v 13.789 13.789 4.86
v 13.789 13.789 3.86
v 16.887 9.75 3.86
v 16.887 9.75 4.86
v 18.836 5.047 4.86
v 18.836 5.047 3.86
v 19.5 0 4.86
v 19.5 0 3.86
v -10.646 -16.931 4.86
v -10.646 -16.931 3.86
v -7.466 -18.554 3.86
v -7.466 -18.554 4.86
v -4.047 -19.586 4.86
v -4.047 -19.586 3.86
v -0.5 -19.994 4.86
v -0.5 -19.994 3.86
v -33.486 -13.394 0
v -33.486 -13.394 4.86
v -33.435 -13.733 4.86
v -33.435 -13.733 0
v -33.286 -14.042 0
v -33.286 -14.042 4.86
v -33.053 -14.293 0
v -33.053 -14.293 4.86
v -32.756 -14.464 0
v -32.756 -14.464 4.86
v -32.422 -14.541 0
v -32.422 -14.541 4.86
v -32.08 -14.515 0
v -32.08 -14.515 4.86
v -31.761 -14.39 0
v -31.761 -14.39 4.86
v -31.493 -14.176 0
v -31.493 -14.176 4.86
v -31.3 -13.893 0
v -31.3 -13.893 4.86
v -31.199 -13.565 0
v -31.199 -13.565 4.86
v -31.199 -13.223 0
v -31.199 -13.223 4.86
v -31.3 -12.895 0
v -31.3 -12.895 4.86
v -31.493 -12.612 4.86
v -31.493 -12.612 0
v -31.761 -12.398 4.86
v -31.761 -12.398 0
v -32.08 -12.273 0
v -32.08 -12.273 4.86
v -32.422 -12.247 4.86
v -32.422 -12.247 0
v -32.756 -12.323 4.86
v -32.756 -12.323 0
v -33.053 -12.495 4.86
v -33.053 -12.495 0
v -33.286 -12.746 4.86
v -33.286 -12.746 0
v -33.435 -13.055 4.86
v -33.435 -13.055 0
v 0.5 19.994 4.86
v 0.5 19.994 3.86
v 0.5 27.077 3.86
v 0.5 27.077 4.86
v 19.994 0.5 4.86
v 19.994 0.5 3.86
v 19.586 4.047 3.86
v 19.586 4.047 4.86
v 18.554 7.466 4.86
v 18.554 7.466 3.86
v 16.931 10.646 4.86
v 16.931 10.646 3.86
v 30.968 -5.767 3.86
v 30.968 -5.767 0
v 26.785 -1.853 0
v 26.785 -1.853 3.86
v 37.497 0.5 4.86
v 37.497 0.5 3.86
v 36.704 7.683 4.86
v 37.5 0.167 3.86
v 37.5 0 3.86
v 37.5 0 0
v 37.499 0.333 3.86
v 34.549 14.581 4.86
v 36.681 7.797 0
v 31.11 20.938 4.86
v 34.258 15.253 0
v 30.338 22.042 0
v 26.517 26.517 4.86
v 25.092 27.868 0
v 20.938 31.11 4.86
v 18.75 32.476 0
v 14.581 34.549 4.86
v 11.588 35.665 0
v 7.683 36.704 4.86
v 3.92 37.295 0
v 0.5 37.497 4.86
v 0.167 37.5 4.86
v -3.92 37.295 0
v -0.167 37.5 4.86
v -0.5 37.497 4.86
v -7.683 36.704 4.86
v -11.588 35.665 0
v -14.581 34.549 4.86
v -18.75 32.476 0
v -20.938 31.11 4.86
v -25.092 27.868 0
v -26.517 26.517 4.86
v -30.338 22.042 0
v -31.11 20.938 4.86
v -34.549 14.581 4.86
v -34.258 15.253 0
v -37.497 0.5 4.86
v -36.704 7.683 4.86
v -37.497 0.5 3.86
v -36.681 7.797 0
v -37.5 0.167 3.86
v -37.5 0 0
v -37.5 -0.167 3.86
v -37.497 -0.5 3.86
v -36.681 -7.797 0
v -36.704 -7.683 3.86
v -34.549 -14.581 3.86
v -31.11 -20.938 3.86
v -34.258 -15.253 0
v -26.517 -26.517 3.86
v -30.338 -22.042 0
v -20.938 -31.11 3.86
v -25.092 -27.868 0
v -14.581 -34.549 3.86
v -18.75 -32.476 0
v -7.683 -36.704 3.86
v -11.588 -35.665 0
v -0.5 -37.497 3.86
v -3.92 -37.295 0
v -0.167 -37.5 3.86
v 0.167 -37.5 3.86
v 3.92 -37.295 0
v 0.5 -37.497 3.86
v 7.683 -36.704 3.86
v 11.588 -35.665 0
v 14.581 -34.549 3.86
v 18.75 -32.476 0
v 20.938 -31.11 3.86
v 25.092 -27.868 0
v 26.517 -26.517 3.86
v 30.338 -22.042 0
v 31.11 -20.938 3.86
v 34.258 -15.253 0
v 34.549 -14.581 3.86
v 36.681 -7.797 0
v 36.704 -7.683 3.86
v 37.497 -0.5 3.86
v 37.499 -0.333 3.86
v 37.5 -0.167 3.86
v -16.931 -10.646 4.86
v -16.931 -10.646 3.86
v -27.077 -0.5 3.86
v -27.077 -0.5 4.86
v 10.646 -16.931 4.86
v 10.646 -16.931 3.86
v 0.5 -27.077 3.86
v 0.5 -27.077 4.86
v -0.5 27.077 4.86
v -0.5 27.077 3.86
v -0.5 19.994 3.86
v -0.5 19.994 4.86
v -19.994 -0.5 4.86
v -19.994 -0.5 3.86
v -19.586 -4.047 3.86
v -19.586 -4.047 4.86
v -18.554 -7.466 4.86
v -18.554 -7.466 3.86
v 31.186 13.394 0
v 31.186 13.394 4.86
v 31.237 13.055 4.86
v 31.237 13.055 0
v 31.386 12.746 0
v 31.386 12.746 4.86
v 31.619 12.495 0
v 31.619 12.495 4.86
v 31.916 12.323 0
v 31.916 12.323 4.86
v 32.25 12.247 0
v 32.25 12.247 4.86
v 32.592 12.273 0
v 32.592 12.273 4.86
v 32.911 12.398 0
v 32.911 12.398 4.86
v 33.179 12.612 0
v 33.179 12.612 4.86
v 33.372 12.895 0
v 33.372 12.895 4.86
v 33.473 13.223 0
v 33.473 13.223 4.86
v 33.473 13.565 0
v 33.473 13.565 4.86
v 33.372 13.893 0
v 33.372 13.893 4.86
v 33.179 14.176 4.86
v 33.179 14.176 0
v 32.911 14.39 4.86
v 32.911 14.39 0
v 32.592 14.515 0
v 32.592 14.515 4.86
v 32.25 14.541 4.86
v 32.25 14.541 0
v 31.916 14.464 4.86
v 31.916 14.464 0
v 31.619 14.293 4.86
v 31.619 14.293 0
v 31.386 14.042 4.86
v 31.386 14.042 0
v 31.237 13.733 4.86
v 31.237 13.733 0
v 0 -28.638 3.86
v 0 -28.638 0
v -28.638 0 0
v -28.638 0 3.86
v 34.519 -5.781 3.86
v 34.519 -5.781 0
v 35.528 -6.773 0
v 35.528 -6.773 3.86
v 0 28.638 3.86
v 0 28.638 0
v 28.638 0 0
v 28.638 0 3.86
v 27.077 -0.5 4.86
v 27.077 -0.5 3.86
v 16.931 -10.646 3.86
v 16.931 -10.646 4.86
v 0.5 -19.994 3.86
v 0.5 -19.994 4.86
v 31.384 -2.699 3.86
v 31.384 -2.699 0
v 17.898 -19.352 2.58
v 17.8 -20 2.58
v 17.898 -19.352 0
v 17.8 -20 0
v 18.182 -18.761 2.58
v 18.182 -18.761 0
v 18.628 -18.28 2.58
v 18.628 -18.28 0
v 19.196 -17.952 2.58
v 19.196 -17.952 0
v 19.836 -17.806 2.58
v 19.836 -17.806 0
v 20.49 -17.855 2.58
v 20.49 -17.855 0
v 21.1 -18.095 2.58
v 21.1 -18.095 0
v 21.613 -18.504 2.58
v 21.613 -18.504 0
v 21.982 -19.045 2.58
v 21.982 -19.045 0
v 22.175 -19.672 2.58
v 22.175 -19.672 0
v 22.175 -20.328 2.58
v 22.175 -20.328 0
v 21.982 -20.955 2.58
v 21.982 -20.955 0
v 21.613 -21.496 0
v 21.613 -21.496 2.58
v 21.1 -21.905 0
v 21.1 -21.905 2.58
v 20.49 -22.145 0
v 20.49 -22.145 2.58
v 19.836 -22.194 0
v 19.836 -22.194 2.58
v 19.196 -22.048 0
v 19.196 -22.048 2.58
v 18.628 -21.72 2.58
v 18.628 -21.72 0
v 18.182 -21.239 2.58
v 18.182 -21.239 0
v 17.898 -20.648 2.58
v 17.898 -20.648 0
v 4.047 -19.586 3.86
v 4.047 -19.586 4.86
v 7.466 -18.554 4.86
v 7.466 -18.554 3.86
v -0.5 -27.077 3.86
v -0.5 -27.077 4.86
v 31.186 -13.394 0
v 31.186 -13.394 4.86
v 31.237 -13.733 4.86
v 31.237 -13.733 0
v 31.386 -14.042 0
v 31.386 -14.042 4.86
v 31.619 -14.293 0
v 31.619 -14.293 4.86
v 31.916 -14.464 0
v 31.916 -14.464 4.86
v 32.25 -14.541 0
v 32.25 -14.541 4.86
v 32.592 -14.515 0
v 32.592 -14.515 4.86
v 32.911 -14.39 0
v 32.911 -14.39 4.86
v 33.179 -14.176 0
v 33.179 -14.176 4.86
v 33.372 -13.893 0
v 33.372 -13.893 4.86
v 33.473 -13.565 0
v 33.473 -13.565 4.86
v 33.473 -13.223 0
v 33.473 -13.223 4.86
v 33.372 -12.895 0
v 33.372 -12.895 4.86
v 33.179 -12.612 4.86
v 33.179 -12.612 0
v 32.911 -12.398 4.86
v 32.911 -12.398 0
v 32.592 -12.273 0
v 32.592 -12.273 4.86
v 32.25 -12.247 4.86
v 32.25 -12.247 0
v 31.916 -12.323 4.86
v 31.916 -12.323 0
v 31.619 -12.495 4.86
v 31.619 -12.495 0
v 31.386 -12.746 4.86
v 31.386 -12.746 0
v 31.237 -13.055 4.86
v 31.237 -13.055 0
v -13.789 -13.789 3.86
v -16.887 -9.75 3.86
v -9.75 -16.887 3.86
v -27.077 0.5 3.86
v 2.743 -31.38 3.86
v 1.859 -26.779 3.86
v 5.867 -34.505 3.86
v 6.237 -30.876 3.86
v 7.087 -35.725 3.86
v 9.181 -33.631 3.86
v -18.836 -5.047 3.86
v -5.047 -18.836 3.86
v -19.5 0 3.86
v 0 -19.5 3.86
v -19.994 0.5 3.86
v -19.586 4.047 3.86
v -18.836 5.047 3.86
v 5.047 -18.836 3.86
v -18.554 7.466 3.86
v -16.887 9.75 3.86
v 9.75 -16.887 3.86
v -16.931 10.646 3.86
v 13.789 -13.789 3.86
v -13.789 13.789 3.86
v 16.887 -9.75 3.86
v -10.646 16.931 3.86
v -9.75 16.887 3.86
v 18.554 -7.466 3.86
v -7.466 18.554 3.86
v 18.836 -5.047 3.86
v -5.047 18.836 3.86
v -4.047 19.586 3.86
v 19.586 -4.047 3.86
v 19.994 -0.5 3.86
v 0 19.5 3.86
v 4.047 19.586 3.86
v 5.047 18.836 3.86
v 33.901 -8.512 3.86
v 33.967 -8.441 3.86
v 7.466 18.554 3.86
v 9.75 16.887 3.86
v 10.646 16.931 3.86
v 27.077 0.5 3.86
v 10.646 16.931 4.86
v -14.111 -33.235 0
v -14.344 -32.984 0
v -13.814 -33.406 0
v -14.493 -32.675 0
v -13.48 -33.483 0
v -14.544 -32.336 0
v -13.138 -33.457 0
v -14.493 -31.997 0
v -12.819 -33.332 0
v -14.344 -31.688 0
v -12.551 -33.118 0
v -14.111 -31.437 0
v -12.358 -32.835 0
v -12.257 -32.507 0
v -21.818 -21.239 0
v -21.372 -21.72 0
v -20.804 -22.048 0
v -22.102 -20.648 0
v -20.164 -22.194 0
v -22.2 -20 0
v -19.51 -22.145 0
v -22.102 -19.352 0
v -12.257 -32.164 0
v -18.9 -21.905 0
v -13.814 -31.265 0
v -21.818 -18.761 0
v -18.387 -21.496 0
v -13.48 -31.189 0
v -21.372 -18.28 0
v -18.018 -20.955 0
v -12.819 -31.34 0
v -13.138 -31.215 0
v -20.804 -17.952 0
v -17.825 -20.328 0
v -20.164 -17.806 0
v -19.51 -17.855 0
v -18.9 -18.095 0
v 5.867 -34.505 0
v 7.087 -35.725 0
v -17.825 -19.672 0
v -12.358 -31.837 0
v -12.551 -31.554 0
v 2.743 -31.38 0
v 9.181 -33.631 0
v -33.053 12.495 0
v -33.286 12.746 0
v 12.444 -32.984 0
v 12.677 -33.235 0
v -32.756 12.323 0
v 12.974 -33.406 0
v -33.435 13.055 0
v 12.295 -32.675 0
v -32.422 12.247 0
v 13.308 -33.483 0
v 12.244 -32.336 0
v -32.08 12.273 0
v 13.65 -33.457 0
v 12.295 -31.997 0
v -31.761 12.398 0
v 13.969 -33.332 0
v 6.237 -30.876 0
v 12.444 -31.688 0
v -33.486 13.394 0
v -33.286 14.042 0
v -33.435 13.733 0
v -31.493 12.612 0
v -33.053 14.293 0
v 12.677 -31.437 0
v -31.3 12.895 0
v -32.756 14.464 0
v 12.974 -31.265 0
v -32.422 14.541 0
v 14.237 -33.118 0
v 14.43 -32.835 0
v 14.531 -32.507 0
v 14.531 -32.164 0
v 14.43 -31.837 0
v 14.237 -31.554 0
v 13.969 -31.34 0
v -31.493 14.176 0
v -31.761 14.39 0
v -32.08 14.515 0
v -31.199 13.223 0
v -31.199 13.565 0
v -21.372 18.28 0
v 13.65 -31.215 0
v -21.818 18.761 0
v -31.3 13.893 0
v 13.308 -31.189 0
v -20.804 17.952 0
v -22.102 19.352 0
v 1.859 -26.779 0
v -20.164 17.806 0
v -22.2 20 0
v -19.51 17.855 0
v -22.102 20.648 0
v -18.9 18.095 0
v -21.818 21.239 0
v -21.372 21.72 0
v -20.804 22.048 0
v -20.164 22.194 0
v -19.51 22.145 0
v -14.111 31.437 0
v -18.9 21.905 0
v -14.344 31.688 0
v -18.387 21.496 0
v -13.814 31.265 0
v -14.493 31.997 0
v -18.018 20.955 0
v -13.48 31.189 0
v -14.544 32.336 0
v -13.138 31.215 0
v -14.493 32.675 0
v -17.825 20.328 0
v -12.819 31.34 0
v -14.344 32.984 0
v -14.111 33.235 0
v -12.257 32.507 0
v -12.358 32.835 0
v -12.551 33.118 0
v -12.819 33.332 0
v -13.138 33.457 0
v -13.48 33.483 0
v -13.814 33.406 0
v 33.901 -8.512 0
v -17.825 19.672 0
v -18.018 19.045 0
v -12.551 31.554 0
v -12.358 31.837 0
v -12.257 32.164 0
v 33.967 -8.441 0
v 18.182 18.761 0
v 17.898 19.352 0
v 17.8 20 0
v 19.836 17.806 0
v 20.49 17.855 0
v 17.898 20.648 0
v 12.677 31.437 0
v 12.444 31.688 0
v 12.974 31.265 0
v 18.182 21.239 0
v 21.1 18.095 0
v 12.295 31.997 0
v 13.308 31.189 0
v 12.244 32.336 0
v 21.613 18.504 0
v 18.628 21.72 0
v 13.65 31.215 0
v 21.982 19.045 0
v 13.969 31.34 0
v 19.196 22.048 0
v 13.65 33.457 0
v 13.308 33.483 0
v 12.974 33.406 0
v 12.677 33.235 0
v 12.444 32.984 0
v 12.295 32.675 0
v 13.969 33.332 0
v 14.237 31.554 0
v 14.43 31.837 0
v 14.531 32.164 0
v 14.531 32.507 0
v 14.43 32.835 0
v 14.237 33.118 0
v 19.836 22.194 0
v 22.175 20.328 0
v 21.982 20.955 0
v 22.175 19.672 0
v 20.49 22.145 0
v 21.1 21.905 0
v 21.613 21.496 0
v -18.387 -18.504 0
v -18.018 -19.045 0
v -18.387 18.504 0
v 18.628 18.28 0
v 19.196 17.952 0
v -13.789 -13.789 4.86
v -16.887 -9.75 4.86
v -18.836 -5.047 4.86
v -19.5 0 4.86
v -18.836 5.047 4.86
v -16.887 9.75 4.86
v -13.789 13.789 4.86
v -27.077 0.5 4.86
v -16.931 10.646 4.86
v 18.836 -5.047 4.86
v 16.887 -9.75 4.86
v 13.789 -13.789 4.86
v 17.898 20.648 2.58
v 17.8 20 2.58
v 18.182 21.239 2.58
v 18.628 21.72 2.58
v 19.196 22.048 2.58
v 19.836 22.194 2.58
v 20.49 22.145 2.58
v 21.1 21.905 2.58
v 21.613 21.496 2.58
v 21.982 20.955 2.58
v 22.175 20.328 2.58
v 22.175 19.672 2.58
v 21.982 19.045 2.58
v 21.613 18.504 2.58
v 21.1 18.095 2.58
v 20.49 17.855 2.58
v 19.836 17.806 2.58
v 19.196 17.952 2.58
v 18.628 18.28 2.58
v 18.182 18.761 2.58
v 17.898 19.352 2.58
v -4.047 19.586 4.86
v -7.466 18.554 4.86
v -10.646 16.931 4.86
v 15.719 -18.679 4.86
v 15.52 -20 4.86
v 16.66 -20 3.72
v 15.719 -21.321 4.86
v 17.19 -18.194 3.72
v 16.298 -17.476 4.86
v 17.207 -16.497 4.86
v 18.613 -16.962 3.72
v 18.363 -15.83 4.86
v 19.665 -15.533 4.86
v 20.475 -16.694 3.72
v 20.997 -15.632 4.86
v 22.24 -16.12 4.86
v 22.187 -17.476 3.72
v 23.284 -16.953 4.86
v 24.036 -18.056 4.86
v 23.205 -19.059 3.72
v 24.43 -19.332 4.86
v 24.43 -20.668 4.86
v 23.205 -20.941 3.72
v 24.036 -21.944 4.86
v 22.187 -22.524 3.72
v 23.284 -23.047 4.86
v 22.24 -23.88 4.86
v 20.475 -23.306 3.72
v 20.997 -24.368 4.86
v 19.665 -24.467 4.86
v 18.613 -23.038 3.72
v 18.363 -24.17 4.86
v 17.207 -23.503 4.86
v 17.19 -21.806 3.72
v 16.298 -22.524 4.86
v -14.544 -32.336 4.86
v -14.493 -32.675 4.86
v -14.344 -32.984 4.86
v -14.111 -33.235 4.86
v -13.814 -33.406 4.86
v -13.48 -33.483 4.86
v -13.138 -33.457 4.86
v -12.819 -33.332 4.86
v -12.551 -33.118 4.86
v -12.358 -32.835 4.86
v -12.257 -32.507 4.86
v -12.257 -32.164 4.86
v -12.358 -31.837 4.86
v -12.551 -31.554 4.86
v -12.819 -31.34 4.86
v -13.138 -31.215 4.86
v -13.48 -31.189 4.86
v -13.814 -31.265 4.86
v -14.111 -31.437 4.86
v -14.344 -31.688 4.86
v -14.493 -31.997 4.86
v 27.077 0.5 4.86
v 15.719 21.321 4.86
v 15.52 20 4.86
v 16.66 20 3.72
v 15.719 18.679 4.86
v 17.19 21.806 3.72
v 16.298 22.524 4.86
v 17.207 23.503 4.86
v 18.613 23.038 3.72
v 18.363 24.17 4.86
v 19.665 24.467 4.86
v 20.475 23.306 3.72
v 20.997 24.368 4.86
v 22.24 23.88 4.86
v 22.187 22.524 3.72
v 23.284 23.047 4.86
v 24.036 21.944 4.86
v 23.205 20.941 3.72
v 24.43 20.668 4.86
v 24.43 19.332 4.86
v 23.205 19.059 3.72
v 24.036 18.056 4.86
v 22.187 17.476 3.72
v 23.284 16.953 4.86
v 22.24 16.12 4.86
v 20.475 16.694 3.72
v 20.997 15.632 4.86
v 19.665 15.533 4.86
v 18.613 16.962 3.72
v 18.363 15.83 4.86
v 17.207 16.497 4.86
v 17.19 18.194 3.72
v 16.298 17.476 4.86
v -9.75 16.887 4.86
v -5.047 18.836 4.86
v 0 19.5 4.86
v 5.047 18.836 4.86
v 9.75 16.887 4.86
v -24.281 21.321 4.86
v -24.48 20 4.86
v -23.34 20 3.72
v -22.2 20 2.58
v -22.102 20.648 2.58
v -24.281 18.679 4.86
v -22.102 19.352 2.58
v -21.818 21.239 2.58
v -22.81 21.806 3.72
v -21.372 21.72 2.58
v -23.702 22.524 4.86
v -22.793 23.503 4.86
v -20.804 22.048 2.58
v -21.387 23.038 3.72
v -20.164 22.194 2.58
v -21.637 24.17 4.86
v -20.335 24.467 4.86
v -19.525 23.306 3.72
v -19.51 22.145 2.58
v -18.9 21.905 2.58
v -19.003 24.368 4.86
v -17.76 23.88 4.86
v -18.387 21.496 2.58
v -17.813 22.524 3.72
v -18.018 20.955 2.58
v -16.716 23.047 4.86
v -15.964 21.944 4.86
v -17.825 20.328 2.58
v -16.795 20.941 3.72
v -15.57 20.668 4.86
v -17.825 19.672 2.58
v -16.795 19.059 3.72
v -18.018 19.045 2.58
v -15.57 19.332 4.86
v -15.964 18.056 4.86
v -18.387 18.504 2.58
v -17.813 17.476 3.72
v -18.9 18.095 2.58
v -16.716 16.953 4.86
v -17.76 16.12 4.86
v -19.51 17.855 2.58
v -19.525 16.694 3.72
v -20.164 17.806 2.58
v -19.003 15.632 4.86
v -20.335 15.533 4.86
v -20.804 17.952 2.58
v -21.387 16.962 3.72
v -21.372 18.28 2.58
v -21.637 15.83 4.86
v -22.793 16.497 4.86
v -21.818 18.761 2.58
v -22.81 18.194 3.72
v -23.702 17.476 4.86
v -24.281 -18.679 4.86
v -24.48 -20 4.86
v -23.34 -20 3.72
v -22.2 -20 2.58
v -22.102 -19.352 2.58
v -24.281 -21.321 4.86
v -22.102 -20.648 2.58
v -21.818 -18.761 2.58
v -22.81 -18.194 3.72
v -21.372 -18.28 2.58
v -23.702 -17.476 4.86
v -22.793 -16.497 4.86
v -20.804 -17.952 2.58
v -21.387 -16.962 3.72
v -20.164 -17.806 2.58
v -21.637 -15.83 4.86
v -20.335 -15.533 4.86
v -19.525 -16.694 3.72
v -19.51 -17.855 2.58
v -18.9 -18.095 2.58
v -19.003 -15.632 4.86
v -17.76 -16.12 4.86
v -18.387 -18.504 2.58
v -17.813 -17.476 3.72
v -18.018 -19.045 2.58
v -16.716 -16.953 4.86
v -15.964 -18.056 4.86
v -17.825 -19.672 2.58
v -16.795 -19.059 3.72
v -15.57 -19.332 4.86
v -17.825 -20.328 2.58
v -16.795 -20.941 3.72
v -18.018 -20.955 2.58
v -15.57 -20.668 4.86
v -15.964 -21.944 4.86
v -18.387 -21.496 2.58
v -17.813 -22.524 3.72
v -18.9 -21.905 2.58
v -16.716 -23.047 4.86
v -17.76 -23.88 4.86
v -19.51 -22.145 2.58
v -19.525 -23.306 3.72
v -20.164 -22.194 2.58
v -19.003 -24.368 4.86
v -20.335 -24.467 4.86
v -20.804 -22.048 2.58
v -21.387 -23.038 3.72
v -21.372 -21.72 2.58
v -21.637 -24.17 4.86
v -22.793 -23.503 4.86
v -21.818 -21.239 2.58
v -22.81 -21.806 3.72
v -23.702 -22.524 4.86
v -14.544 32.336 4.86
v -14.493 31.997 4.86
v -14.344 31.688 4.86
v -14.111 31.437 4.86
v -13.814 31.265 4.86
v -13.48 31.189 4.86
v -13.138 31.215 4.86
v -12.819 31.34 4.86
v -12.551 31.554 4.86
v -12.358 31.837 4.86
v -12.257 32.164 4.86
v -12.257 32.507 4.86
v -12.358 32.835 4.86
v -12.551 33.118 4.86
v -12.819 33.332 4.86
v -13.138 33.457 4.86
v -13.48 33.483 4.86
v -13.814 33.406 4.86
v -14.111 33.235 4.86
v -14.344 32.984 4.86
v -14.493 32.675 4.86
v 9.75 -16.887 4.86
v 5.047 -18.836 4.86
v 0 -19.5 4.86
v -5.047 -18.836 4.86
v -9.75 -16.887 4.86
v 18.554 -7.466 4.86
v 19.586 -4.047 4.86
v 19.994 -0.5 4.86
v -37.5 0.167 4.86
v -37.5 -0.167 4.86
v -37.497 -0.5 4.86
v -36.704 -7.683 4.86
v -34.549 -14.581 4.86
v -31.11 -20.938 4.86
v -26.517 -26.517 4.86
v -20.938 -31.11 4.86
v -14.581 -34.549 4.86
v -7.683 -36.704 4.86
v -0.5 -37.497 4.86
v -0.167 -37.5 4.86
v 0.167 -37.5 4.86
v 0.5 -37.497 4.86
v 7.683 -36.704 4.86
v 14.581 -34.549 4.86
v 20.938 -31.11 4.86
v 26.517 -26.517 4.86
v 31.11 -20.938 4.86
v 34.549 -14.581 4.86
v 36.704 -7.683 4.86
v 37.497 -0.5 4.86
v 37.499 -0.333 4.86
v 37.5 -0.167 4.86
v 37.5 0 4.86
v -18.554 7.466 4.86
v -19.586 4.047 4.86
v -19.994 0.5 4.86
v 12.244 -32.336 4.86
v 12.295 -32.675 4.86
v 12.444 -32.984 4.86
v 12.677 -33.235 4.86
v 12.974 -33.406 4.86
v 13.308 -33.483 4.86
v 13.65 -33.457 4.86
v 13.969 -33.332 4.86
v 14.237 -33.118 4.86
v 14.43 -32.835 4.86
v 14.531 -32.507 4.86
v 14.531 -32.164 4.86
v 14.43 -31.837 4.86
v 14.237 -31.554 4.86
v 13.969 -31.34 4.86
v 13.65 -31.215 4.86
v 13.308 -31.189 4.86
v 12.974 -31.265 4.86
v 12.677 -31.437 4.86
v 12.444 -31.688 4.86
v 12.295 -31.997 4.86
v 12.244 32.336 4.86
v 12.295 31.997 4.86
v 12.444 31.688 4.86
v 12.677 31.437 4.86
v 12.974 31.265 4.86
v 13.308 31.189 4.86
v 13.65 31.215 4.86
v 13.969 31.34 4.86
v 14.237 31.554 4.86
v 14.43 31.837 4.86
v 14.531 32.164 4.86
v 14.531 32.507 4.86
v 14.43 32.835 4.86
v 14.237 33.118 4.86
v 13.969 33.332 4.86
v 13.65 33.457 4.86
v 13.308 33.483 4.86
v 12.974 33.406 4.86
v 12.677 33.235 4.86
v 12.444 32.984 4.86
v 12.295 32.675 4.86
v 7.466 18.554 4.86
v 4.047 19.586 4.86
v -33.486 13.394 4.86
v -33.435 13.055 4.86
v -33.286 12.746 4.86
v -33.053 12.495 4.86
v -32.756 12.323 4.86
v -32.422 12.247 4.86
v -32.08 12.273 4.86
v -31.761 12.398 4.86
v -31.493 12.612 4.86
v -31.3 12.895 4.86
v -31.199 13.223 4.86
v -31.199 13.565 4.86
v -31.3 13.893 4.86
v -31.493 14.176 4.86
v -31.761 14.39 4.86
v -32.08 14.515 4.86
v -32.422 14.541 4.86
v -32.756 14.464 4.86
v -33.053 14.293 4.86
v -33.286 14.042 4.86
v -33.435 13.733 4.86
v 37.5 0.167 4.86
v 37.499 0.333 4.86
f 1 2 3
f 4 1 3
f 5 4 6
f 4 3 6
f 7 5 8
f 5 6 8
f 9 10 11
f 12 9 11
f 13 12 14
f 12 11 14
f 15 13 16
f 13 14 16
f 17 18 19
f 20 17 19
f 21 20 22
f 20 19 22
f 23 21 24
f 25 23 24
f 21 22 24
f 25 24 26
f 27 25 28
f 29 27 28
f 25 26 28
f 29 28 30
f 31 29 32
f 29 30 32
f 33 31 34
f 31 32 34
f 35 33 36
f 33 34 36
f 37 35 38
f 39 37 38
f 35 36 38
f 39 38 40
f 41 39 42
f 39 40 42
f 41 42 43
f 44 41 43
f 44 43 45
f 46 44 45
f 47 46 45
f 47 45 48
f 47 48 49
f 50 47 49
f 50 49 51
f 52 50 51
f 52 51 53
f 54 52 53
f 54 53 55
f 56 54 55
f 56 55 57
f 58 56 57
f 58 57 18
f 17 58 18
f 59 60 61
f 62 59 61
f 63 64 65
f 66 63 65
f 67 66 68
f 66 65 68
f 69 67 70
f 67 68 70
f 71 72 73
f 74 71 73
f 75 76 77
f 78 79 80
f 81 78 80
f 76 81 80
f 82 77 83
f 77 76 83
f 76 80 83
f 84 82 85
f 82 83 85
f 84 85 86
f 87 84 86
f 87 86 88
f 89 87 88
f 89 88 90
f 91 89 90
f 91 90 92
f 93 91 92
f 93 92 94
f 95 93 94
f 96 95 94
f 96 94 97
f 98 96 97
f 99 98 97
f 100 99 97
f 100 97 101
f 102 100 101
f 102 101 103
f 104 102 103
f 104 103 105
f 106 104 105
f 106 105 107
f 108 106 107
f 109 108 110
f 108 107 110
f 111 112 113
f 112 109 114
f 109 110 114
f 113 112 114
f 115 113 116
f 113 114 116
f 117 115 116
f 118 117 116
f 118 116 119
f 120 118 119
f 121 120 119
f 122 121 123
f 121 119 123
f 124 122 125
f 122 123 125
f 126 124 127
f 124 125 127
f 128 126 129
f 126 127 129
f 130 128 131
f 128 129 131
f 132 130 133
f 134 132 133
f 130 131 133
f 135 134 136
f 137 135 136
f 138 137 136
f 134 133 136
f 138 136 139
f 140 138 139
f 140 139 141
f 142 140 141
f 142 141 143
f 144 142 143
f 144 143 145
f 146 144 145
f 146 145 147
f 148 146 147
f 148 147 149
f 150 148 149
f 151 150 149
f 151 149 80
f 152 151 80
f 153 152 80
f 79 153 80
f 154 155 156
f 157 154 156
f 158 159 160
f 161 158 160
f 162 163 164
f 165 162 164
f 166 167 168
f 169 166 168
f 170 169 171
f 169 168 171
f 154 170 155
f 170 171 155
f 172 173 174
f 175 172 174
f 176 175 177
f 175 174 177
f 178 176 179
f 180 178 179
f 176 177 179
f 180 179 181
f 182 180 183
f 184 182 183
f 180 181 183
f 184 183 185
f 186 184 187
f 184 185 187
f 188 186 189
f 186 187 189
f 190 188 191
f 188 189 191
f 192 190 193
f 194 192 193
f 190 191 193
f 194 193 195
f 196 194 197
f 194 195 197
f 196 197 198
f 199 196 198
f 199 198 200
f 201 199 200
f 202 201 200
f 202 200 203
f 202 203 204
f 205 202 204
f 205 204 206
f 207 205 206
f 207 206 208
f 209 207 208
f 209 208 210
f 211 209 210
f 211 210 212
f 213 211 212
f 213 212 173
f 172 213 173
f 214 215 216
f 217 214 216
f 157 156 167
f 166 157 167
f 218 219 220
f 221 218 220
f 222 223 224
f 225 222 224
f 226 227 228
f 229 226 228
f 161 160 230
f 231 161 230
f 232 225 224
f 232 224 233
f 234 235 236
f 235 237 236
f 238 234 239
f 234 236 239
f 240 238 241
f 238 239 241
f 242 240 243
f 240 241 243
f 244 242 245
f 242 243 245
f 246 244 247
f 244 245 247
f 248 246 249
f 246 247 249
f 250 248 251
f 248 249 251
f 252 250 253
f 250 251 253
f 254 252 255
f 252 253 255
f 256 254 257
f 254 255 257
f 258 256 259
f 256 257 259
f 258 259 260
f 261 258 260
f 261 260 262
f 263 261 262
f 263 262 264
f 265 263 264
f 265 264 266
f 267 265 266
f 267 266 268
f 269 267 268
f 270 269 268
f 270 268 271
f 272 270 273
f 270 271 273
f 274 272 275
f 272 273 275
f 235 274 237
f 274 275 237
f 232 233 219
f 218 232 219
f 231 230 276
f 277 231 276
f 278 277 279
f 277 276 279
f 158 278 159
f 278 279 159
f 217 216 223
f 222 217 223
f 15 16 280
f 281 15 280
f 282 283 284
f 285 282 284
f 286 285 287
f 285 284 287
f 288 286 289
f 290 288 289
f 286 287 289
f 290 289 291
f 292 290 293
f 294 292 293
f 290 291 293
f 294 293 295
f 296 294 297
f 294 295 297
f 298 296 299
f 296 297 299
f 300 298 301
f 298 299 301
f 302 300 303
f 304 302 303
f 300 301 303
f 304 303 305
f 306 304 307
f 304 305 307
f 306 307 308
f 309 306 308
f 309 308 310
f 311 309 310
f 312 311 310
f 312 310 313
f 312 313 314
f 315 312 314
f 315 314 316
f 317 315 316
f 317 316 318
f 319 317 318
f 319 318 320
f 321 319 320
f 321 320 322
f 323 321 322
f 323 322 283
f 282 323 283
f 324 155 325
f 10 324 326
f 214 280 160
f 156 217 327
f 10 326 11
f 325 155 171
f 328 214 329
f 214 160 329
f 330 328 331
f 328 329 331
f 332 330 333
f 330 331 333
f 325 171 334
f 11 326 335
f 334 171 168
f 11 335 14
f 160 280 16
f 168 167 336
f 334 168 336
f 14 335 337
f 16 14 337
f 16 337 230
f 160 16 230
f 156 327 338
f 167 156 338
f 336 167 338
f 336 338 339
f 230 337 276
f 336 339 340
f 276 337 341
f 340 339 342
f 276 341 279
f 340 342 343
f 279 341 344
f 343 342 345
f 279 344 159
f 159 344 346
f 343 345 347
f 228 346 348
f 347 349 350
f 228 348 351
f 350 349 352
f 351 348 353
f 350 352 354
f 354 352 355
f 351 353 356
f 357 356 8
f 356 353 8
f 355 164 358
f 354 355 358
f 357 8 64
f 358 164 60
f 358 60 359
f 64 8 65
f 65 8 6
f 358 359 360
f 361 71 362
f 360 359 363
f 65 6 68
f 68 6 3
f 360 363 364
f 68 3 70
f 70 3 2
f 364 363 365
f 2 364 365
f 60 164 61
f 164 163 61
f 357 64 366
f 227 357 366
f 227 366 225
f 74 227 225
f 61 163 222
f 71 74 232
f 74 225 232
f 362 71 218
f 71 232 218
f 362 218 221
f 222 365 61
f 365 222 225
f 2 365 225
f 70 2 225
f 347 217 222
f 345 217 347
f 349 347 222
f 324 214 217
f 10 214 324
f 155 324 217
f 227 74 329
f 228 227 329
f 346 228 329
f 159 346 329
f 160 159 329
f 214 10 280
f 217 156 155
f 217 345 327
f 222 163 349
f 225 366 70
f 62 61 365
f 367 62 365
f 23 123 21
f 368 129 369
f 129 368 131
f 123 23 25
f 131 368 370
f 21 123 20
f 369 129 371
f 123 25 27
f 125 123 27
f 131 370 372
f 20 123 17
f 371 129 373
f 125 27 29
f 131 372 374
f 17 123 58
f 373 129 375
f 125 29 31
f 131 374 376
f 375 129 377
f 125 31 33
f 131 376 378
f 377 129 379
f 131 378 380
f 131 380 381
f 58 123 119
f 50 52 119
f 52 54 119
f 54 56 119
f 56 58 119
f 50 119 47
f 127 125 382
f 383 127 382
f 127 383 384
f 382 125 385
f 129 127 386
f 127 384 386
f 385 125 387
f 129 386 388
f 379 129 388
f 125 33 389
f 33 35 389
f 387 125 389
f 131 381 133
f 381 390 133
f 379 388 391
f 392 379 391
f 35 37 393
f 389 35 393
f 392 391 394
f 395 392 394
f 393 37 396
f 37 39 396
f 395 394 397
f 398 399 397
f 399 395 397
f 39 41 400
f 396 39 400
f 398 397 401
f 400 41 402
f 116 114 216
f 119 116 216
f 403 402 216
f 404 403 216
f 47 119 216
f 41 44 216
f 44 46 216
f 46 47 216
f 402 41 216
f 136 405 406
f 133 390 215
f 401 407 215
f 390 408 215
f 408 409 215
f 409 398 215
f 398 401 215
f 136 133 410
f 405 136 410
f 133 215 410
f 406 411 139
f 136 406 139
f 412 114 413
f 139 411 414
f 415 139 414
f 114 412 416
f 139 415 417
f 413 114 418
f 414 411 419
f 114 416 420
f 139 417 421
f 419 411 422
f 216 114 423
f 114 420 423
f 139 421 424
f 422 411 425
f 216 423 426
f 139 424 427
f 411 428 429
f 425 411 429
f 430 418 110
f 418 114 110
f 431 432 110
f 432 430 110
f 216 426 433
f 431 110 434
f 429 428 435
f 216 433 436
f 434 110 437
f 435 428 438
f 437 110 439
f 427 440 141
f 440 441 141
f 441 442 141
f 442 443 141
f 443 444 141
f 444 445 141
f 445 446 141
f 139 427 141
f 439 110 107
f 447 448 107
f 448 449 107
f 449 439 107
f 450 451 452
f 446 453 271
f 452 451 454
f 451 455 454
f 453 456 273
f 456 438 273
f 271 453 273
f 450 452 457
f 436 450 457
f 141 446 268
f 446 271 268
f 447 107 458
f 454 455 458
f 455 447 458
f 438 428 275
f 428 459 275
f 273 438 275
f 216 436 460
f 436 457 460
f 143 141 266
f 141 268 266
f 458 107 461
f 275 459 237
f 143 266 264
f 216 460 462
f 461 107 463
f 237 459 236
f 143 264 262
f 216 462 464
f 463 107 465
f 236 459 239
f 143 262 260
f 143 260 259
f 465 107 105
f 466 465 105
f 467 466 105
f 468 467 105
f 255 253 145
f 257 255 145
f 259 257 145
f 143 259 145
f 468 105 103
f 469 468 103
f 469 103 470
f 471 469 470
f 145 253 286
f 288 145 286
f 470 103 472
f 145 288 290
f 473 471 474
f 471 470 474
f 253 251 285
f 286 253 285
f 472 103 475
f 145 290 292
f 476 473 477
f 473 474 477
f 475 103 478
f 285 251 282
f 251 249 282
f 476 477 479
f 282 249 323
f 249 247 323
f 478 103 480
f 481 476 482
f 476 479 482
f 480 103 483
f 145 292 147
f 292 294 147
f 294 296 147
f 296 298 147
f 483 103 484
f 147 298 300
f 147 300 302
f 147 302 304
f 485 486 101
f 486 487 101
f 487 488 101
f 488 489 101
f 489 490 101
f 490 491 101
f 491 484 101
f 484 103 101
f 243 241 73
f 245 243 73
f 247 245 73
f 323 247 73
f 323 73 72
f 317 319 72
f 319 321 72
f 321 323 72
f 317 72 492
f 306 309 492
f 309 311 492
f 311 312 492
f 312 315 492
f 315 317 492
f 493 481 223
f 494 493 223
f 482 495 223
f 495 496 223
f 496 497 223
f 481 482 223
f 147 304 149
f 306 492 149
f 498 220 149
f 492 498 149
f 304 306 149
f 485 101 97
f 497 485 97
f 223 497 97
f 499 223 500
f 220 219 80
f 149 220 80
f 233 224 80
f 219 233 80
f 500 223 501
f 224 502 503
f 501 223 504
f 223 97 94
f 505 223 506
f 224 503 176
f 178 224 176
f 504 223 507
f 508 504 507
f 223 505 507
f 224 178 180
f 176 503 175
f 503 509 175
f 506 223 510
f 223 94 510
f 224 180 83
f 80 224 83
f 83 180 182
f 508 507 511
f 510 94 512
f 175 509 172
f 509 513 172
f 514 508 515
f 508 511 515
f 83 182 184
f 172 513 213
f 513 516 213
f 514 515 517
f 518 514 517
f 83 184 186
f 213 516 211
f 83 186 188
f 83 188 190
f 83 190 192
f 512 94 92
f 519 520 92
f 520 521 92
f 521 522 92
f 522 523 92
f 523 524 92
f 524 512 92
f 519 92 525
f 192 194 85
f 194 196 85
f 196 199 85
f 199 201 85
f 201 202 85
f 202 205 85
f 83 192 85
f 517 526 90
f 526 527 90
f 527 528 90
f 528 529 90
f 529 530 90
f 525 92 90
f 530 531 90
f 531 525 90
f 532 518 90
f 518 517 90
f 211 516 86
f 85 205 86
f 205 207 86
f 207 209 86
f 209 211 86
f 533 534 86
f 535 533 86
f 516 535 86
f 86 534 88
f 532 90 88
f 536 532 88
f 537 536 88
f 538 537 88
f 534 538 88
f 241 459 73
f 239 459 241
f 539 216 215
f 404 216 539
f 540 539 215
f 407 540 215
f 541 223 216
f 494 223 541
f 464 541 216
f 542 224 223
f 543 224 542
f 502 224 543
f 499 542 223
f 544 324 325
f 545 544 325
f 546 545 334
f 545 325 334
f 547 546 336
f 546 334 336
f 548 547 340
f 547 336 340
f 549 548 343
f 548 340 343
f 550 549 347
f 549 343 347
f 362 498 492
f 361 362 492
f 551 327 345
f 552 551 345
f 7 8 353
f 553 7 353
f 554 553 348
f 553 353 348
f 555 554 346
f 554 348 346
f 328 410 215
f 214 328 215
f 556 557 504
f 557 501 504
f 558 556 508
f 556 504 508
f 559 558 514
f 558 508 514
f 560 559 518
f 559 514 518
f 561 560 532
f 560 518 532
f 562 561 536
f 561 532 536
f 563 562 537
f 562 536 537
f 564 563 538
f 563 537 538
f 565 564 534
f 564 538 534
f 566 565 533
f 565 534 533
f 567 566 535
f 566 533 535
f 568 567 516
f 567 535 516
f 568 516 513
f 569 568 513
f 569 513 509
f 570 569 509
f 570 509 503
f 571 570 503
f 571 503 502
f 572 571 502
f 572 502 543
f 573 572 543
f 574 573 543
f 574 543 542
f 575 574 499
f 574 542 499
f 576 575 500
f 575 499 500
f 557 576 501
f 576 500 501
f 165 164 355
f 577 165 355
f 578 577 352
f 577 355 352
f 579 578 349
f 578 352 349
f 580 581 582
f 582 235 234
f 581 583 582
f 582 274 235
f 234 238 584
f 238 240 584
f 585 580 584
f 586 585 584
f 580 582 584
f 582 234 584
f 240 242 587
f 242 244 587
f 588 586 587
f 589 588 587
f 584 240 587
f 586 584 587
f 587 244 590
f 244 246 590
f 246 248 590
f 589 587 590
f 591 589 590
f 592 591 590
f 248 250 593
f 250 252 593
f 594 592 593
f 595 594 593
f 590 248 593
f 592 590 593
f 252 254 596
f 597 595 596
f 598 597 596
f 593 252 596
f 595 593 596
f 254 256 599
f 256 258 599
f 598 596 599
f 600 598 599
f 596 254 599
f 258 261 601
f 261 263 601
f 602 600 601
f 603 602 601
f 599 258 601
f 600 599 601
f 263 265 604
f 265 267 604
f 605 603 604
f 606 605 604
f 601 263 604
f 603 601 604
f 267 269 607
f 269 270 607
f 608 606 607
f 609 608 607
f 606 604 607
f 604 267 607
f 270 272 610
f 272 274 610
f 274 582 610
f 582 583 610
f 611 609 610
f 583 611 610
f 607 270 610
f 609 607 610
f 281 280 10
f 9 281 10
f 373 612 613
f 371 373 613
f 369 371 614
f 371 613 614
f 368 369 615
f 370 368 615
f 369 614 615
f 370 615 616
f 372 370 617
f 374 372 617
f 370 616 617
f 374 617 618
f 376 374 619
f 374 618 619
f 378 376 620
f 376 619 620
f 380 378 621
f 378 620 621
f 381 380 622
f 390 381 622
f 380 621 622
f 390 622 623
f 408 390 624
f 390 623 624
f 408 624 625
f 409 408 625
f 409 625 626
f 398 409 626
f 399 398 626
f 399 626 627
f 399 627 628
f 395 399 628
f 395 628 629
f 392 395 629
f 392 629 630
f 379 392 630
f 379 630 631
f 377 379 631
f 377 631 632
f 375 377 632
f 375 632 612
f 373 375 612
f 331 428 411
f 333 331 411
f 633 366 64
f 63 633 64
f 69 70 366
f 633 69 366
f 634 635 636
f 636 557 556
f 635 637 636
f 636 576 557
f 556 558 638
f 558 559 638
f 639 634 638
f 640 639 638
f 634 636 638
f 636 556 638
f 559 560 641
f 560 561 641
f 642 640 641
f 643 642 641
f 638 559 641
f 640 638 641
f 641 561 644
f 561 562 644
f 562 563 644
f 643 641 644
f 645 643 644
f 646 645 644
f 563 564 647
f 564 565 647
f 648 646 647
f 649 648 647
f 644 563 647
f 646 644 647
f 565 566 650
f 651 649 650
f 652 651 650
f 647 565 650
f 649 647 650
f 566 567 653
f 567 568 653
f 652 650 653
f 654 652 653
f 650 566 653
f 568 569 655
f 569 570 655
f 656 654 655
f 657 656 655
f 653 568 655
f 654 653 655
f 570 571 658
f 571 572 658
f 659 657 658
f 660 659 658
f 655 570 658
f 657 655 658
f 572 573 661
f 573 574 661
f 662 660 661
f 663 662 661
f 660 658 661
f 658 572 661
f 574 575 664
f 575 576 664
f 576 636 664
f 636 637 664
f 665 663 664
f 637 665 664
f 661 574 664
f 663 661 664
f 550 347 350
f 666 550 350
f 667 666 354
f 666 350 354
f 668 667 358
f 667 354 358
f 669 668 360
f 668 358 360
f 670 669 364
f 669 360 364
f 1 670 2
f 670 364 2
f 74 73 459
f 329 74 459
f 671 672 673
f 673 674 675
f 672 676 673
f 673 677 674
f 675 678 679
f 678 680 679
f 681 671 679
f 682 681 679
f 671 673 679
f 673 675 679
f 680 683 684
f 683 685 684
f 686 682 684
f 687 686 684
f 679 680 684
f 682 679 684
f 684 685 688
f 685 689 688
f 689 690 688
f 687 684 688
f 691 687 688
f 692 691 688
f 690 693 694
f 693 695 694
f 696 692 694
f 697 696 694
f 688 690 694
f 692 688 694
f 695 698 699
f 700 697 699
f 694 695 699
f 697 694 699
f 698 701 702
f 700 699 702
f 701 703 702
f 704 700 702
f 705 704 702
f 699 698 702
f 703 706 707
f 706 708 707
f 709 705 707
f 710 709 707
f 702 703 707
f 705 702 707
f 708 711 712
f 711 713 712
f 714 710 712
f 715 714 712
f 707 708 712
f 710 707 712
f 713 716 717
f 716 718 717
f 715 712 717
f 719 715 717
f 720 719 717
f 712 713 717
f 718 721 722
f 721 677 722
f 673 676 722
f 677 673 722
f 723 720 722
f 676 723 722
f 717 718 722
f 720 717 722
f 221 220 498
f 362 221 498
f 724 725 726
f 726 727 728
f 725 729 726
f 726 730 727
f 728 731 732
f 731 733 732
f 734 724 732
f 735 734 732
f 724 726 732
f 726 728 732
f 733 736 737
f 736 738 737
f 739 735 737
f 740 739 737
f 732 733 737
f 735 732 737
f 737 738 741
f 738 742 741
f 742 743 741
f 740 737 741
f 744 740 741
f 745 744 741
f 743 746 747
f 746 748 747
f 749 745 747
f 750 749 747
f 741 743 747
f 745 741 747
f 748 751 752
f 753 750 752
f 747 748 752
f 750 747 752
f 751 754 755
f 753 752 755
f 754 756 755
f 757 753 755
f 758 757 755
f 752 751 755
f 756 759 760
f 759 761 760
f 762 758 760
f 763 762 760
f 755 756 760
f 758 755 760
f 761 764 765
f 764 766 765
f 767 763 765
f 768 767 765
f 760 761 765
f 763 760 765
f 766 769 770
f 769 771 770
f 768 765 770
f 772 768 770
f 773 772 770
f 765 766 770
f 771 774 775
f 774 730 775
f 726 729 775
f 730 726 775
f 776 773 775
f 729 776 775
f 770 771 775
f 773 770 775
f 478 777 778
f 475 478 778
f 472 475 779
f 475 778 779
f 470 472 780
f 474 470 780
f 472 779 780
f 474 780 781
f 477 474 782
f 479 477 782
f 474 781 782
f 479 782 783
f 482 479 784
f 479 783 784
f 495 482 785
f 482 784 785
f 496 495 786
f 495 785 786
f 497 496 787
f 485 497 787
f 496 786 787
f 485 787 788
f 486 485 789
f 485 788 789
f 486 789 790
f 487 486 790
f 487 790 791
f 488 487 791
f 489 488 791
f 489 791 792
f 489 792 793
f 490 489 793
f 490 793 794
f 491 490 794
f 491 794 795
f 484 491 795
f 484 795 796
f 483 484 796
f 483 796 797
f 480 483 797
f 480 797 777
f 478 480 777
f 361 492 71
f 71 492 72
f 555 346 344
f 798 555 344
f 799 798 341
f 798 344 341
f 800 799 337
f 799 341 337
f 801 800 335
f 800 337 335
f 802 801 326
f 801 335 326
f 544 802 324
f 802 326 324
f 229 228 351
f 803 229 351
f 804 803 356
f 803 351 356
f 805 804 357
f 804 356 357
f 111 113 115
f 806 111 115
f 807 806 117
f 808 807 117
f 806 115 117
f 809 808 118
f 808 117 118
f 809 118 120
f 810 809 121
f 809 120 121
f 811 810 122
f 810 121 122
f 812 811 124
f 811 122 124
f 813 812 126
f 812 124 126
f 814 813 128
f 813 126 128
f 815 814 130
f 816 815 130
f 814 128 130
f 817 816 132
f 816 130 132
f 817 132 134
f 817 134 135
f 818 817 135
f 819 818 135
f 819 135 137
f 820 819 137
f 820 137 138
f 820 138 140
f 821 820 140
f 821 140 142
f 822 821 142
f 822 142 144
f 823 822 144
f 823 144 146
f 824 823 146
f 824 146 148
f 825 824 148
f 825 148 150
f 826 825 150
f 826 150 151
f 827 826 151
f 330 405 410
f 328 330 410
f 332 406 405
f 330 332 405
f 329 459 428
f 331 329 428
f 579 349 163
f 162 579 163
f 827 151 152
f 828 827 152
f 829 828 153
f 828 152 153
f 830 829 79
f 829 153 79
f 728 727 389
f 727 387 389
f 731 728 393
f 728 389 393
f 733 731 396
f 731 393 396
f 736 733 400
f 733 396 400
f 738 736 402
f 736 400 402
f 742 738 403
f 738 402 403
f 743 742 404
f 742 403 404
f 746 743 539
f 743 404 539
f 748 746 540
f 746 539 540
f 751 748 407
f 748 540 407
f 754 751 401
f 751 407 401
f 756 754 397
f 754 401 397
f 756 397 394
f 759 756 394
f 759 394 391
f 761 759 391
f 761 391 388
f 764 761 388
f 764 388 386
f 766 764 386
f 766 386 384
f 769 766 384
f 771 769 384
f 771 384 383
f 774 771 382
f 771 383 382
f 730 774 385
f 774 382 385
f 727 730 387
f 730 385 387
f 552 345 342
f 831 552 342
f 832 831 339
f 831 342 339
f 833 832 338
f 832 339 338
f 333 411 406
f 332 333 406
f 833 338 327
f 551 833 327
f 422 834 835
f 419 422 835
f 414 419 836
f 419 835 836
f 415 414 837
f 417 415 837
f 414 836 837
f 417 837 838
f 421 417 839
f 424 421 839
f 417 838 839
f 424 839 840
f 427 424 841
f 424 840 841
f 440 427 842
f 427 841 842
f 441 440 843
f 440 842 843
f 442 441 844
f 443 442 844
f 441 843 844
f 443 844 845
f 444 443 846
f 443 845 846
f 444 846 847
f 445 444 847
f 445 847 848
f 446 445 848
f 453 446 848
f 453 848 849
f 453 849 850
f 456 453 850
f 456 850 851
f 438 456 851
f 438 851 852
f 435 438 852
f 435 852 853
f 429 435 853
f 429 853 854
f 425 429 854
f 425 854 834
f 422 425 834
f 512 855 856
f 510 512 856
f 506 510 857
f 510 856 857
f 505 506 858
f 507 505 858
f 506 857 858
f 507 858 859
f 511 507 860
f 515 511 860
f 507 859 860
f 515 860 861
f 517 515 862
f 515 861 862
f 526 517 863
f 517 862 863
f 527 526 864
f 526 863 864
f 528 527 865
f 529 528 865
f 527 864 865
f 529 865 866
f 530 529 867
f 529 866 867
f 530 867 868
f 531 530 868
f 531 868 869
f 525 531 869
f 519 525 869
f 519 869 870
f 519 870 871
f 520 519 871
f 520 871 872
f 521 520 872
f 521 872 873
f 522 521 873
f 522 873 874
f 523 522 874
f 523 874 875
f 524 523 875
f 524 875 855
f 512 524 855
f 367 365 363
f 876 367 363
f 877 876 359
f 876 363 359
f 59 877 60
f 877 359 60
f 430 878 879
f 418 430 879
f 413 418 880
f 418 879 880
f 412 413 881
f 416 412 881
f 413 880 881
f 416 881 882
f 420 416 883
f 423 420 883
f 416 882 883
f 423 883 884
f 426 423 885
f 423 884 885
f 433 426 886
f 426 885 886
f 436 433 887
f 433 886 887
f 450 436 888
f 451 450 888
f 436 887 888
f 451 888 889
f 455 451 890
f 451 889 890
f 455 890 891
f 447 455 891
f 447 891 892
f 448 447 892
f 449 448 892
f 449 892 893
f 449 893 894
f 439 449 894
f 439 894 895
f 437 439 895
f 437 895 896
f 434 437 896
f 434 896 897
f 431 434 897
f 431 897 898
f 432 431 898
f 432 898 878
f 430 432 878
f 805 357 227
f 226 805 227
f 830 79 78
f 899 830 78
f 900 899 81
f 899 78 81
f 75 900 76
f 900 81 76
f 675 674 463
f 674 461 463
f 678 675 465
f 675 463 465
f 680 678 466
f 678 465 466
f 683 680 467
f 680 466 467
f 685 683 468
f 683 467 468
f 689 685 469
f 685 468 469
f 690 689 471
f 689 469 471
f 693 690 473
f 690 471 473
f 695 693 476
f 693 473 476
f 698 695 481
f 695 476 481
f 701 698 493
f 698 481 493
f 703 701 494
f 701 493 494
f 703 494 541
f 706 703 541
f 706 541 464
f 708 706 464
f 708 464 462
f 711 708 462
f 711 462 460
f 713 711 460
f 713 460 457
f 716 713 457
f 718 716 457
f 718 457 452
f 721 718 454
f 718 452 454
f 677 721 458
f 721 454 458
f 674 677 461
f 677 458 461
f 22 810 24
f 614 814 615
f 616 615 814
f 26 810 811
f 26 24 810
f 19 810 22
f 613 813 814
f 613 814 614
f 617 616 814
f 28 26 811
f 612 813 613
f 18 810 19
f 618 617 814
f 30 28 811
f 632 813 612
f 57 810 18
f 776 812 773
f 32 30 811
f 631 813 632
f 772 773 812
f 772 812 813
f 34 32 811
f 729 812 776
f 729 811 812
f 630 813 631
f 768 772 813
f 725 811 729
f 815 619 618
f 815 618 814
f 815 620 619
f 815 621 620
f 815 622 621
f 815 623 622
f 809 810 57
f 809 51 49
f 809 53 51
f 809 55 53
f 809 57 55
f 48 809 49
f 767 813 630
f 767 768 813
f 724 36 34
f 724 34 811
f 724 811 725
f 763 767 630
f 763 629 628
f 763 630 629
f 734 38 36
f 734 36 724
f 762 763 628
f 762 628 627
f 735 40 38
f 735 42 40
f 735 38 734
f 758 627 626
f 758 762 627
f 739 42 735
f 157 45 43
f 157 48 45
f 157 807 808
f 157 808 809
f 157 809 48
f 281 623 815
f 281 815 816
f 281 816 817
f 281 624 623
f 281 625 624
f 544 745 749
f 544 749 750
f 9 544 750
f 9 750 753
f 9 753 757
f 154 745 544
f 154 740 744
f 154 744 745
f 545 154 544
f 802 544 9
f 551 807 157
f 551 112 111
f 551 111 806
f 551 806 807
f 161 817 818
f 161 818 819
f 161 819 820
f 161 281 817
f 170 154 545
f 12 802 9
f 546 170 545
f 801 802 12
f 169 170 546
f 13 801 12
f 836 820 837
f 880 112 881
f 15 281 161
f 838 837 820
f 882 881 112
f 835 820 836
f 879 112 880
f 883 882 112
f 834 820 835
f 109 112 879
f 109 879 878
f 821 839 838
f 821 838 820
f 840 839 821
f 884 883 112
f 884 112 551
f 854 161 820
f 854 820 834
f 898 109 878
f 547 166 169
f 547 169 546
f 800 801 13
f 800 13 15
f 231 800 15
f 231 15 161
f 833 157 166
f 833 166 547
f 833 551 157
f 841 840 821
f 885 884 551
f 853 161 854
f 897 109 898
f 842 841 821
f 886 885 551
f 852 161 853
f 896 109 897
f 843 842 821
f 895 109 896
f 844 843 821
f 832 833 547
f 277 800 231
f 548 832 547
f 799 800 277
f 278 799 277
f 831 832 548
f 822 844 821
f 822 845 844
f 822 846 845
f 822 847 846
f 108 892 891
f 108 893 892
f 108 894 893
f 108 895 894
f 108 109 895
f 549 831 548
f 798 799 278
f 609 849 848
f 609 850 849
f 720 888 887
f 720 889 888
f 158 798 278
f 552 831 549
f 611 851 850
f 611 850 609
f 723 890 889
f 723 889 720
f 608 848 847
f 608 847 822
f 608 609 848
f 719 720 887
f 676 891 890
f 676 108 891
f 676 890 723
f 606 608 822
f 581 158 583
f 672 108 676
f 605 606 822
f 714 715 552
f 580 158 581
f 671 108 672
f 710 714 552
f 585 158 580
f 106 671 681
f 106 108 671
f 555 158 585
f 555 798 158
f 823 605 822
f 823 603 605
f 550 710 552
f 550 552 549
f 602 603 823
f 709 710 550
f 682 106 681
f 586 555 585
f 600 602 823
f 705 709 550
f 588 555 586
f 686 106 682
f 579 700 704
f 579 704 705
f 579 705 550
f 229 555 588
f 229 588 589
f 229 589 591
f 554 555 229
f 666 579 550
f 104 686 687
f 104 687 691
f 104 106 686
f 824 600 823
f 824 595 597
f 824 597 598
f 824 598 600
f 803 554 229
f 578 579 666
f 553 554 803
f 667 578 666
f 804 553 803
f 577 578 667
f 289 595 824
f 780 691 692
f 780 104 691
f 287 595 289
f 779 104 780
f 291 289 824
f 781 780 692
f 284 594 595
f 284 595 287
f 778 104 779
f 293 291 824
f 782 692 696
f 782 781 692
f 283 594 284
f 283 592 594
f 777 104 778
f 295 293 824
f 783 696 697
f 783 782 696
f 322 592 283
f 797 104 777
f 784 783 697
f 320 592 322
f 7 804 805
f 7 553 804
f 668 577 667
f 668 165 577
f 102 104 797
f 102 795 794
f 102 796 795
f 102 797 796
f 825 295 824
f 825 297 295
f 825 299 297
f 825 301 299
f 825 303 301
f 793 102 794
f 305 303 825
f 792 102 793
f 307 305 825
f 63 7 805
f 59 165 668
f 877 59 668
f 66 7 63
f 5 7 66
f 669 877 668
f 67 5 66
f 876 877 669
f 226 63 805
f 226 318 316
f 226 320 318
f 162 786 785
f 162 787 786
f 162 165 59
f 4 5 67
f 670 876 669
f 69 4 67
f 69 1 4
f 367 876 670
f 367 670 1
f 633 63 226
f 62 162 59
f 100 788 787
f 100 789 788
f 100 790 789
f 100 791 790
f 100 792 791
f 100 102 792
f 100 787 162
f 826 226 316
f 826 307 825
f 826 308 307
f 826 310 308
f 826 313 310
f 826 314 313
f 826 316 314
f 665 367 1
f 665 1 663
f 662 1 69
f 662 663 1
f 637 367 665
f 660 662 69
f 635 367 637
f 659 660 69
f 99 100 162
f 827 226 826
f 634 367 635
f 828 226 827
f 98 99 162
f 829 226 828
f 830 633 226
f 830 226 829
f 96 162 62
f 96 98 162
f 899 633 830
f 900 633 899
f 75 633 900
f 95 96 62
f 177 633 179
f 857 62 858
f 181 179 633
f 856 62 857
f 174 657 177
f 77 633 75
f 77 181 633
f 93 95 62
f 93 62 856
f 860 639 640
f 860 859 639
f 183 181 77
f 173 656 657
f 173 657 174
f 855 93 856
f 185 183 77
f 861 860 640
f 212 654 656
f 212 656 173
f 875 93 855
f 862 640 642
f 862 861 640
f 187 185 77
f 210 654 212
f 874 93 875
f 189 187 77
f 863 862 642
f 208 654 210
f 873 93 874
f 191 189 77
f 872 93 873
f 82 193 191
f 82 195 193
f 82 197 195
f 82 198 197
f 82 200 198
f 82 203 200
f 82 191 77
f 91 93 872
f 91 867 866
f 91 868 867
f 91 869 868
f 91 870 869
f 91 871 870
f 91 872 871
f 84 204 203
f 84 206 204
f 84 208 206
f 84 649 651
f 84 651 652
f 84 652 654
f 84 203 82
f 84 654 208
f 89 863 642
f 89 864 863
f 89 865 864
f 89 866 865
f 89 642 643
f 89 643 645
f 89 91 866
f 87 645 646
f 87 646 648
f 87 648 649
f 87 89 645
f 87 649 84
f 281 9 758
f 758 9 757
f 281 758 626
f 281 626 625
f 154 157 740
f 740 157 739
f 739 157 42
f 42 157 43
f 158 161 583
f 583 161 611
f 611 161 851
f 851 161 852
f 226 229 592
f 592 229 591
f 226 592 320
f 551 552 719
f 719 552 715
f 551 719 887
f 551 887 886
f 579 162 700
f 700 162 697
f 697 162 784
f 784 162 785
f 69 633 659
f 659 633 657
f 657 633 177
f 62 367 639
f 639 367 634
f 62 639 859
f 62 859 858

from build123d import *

# Parameters (mm, degrees)
F0_R           = 37.5
F1_DEPTH       = 3.86
F3_DEPTH       = 1
F5_D           = 4.4
F5_DEPTH       = 50
F5_CSINK_D     = 8.96
F5_CSINK_ANGLE = 90
F5_TIP         = 1.3218933619
F6_D           = 2.3
F6_DEPTH       = 50
F6_TIP         = 0.6909897119


# Not quite as in the source:
# - a feature names something its author has since deleted; it is built from what else it names


with BuildPart() as f1:
    # F0 (on Top) → F1 (new body)
    with BuildSketch(Plane.XY):
        Circle(F0_R)
        with BuildLine():
            Line((35.5279936079, -6.7726684482), (33.9669435175, -8.4407788788))
            ThreePointArc((33.9669435175, -8.4407788788), (24.9465264027, -24.5493547866), (8.9847812304, -33.8271149559))
            Line((8.9847812304, -33.8271149559), (7.0870357741, -35.7248604122))
            Line((7.0870357741, -35.7248604122), (5.8669428771, -34.5047675152))
            Line((5.8669428771, -34.5047675152), (2.7425574301, -31.3803820681))
            ThreePointArc((2.7425574301, -31.3803820681), (-22.2891525488, 22.2585641643), (31.3841187925, -2.6994606157))
            Line((31.3841187925, -2.6994606157), (34.5192493346, -5.7811266526))
            Line((34.5192493346, -5.7811266526), (35.5279936079, -6.7726684482))
        make_face(mode=Mode.SUBTRACT)
        with BuildLine():
            Line((28.6378246381, 0), (31.3841187925, -2.6994606157))
            ThreePointArc((31.3841187925, -2.6994606157), (-22.2891525488, 22.2585641643), (2.7425574301, -31.3803820681))
            Line((2.7425574301, -31.3803820681), (0, -28.6378246381))
            Line((0, -28.6378246381), (-28.6378246381, 0))
            Line((-28.6378246381, 0), (0, 28.6378246381))
            Line((0, 28.6378246381), (28.6378246381, 0))
        make_face()
        with BuildLine():
            Line((30.967620581, -5.7668427717), (26.7850823006, -1.8527423374))
            Line((26.7850823006, -1.8527423374), (1.8586698278, -26.7791548102))
            Line((1.8586698278, -26.7791548102), (6.2368967636, -30.8763844833))
            ThreePointArc((6.2368967636, -30.8763844833), (22.442510977, -22.1039295386), (30.967620581, -5.7668427717))
        make_face()
        with BuildLine():
            Line((33.9006451973, -8.5116240875), (30.967620581, -5.7668427717))
            ThreePointArc((30.967620581, -5.7668427717), (22.442510977, -22.1039295386), (6.2368967636, -30.8763844833))
            Line((6.2368967636, -30.8763844833), (9.1806708369, -33.6312253494))
            Line((9.1806708369, -33.6312253494), (8.9847812304, -33.8271149559))
            ThreePointArc((8.9847812304, -33.8271149559), (24.9465264027, -24.5493547866), (33.9669435175, -8.4407788788))
            Line((33.9669435175, -8.4407788788), (33.9006451973, -8.5116240875))
        make_face()
    extrude(amount=F1_DEPTH)

    # F2 (on face) → F3 (join)
    with BuildSketch(Plane.XY.offset(3.86)):
        with BuildLine():
            ThreePointArc((37.4966665185, -0.5), (37.4991666204, -0.250005556), (37.5, 0))
            ThreePointArc((37.5, 0), (37.4991666204, 0.250005556), (37.4966665185, 0.5))
            Line((37.4966665185, 0.5), (37.4966665185, -0.5))
        make_face()
        with BuildLine():
            Line((37.4966665185, -0.5), (37.4966665185, 0.5))
            ThreePointArc((37.4966665185, 0.5), (26.5165042945, 26.5165042945), (0.5, 37.4966665185))
            Line((0.5, 37.4966665185), (-0.5, 37.4966665185))
            ThreePointArc((-0.5, 37.4966665185), (-26.5165042945, 26.5165042945), (-37.4966665185, 0.5))
            Line((-37.4966665185, 0.5), (-37.4966665185, -0.5))
            ThreePointArc((-37.4966665185, -0.5), (-26.5165042945, -26.5165042945), (-0.5, -37.4966665185))
            Line((-0.5, -37.4966665185), (0.5, -37.4966665185))
            ThreePointArc((0.5, -37.4966665185), (26.5165042945, -26.5165042945), (37.4966665185, -0.5))
        make_face()
        with BuildLine():
            Line((-0.5, -27.0771644663), (-10.6461309606, -16.9310335056))
            ThreePointArc((-10.6461309606, -16.9310335056), (-5.7796293509, -19.1466938286), (-0.5, -19.9937490231))
            Line((-0.5, -19.9937490231), (-0.5, -27.0771644663))
        make_face(mode=Mode.SUBTRACT)
        with BuildLine():
            ThreePointArc((-19.9937490231, -0.5), (-19.1466938286, -5.7796293509), (-16.9310335056, -10.6461309606))
            Line((-16.9310335056, -10.6461309606), (-27.0771644663, -0.5))
            Line((-27.0771644663, -0.5), (-19.9937490231, -0.5))
        make_face(mode=Mode.SUBTRACT)
        with BuildLine():
            ThreePointArc((0.5, -19.9937490231), (5.7796293509, -19.1466938286), (10.6461309606, -16.9310335056))
            Line((10.6461309606, -16.9310335056), (0.5, -27.0771644663))
            Line((0.5, -27.0771644663), (0.5, -19.9937490231))
        make_face(mode=Mode.SUBTRACT)
        with BuildLine():
            Line((27.0771644663, -0.5), (16.9310335056, -10.6461309606))
            ThreePointArc((16.9310335056, -10.6461309606), (19.1466938286, -5.7796293509), (19.9937490231, -0.5))
            Line((19.9937490231, -0.5), (27.0771644663, -0.5))
        make_face(mode=Mode.SUBTRACT)
        with BuildLine():
            Line((-27.0771644663, 0.5), (-16.9310335056, 10.6461309606))
            ThreePointArc((-16.9310335056, 10.6461309606), (-19.1466938286, 5.7796293509), (-19.9937490231, 0.5))
            Line((-19.9937490231, 0.5), (-27.0771644663, 0.5))
        make_face(mode=Mode.SUBTRACT)
        with BuildLine():
            ThreePointArc((-0.5, 19.9937490231), (-5.7796293509, 19.1466938286), (-10.6461309606, 16.9310335056))
            Line((-10.6461309606, 16.9310335056), (-0.5, 27.0771644663))
            Line((-0.5, 27.0771644663), (-0.5, 19.9937490231))
        make_face(mode=Mode.SUBTRACT)
        with BuildLine():
            ThreePointArc((13.7885822494, 13.7885822168), (18.0156508884, 7.4623269205), (19.5, 0))
            ThreePointArc((19.5, 0), (18.015650884, -7.4623269311), (13.7885822331, -13.7885822331))
            ThreePointArc((13.7885822331, -13.7885822331), (4.88e-08, -19.5), (-13.7885821641, -13.7885823022))
            ThreePointArc((-13.7885821641, -13.7885823022), (-19.5, -3.62e-08), (-13.7885822154, 13.7885822509))
            ThreePointArc((-13.7885822154, 13.7885822509), (2.41e-08, 19.5), (13.7885822494, 13.7885822168))
        make_face(mode=Mode.SUBTRACT)
        with BuildLine():
            ThreePointArc((19.9937490231, 0.5), (19.1466938286, 5.7796293509), (16.9310335056, 10.6461309606))
            Line((16.9310335056, 10.6461309606), (27.0771644663, 0.5))
            Line((27.0771644663, 0.5), (19.9937490231, 0.5))
        make_face(mode=Mode.SUBTRACT)
        with BuildLine():
            Line((0.5, 27.0771644663), (10.6461309606, 16.9310335056))
            ThreePointArc((10.6461309606, 16.9310335056), (5.7796293509, 19.1466938286), (0.5, 19.9937490231))
            Line((0.5, 19.9937490231), (0.5, 27.0771644663))
        make_face(mode=Mode.SUBTRACT)
        with BuildLine():
            Line((-0.5, 37.4966665185), (0.5, 37.4966665185))
            ThreePointArc((0.5, 37.4966665185), (0, 37.5), (-0.5, 37.4966665185))
        make_face()
        with BuildLine():
            ThreePointArc((-0.5, -37.4966665185), (0, -37.5), (0.5, -37.4966665185))
            Line((0.5, -37.4966665185), (-0.5, -37.4966665185))
        make_face()
        with BuildLine():
            Line((-37.4966665185, -0.5), (-37.4966665185, 0.5))
            ThreePointArc((-37.4966665185, 0.5), (-37.5, 0), (-37.4966665185, -0.5))
        make_face()
    extrude(amount=F3_DEPTH)

    # F5
    with Locations(Plane.XY.offset(4.86)):
        with Locations((-20, -20), (20, -20), (20, 20), (-20, 20)):
            CounterSinkHole(F5_D / 2, F5_CSINK_D / 2, depth=F5_DEPTH, counter_sink_angle=F5_CSINK_ANGLE)
            with Locations((0, 0, -(F5_DEPTH + F5_TIP / 2))):  # 118° drill point
                Cone(0, F5_D / 2, F5_TIP, mode=Mode.SUBTRACT)

    # F6
    with Locations(Plane(origin=(0, 0, 0), x_dir=(1, 0, 0), z_dir=(0, 0, -1))):
        with Locations((-32.3357836379, -13.3939201328), (-13.3939201328, -32.3357836379), (13.3939201328, -32.3357836379), (32.3357836379, -13.3939201328), (32.3357836379, 13.3939201328), (13.3939201328, 32.3357836379), (-13.3939201328, 32.3357836379), (-32.3357836379, 13.3939201328)):
            Hole(F6_D / 2, depth=F6_DEPTH)
            with Locations((0, 0, -(F6_DEPTH + F6_TIP / 2))):  # 118° drill point
                Cone(0, F6_D / 2, F6_TIP, mode=Mode.SUBTRACT)


solid = f1.part
